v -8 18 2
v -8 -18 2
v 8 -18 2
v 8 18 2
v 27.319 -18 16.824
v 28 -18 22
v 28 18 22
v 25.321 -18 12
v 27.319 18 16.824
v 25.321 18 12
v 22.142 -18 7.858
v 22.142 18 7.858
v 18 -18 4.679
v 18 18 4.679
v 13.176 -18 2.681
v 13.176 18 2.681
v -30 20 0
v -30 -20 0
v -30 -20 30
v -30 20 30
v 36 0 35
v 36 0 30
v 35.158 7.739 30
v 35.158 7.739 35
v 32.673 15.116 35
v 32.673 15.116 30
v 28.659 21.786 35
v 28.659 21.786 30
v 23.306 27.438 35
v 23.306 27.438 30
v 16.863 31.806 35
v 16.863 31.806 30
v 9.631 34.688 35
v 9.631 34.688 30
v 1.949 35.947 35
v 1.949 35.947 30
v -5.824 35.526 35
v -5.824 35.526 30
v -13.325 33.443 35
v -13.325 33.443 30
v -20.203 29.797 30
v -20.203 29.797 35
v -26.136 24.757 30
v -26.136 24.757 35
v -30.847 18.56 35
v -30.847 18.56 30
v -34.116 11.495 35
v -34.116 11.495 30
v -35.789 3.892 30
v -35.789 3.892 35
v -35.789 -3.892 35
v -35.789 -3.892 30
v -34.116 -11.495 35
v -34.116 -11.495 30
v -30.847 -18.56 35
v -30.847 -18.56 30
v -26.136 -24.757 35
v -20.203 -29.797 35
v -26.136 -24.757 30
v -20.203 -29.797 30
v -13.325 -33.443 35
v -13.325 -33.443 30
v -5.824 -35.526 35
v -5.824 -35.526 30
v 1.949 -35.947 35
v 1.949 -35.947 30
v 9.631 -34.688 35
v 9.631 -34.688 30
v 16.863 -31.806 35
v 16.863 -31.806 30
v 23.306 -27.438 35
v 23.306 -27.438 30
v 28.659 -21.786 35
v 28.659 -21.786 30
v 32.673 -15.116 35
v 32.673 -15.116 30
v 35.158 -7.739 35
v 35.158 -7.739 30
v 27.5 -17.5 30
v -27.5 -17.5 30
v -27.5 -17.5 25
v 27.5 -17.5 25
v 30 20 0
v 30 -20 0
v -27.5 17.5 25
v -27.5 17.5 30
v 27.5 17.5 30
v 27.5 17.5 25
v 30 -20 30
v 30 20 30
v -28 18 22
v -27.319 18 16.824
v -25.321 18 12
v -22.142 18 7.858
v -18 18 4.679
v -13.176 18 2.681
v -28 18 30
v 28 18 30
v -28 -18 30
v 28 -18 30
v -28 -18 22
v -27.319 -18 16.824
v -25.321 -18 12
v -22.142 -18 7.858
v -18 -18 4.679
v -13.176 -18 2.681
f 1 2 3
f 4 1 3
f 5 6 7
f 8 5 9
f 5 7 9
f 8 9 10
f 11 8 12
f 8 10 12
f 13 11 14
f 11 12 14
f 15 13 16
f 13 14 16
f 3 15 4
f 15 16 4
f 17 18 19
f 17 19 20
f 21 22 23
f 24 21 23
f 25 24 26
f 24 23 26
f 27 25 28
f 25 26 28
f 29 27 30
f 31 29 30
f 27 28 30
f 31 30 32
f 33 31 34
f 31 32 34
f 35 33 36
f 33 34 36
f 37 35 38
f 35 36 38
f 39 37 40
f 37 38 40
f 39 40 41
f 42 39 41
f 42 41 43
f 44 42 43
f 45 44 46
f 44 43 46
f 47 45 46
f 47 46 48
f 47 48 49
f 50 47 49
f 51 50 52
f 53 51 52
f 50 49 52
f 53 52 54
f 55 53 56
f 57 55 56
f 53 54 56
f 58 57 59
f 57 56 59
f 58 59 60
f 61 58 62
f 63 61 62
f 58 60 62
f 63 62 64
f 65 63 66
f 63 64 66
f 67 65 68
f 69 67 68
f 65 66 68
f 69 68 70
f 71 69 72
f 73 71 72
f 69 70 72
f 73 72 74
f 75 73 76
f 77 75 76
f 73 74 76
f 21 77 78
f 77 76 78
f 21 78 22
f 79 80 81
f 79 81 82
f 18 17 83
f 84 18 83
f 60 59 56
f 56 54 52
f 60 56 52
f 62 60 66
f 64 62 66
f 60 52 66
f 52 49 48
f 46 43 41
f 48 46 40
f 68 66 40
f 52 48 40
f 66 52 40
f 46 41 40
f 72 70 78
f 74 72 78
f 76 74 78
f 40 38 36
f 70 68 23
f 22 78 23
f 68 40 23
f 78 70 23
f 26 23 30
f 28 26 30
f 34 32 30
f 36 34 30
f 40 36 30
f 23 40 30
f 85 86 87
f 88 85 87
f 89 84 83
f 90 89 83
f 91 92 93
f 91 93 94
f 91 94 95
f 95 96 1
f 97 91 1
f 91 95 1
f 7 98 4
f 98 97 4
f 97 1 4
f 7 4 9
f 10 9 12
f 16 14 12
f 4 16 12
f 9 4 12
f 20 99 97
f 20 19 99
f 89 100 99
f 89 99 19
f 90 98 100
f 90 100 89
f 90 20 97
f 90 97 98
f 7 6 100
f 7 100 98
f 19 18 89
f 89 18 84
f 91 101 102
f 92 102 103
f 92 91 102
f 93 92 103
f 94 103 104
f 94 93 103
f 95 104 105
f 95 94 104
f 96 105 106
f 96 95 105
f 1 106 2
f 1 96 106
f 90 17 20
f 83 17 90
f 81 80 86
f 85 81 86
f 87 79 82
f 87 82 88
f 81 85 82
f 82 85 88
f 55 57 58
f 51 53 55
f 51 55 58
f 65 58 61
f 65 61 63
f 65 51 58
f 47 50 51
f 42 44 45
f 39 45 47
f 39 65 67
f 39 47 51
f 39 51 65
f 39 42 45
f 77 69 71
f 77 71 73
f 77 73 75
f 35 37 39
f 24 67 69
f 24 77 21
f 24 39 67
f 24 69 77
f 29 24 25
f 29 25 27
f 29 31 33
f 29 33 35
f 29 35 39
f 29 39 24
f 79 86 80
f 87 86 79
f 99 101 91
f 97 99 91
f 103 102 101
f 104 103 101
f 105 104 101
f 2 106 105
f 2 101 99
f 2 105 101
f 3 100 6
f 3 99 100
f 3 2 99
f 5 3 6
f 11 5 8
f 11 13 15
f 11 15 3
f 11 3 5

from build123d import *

# Parameters (mm, degrees)
F0_W     = 60
F0_H     = 40
F1_DEPTH = 30
F2_T     = -2
F3_R     = 20
F4_W     = 55
F4_H     = 35
F5_DEPTH = 5
F6_R     = 36
F6_W     = 55
F6_H     = 35
F7_DEPTH = 5


with BuildPart() as f1:
    # F0 (on Top) → F1 (new body)
    with BuildSketch(Plane.XY):
        Rectangle(F0_W, F0_H)
    extrude(amount=F1_DEPTH)

    # F2
    f2_openings = [f1.faces().sort_by_distance(p)[0] for p in [
        (0, 0, 30),
    ]]
    offset(amount=F2_T, openings=f2_openings)

    # F3
    f3_edges = [f1.edges().sort_by_distance(p)[0] for p in [
        (28, 0, 2),
        (-28, 0, 2),
    ]]
    fillet(f3_edges, radius=F3_R)


with BuildPart() as f5:
    # F4 (on face) → F5 (new body)
    with BuildSketch(Plane.XY.offset(30)):
        Rectangle(F4_W, F4_H)
    extrude(amount=-F5_DEPTH)


with BuildPart() as f7:
    # F6 (on face) → F7 (new body)
    with BuildSketch(Plane.XY.offset(30)):
        Circle(F6_R)
        Rectangle(F6_W, F6_H, mode=Mode.SUBTRACT)
        Rectangle(F6_W, F6_H)
    extrude(amount=F7_DEPTH)


solid = Compound([f1.part, f5.part, f7.part])
